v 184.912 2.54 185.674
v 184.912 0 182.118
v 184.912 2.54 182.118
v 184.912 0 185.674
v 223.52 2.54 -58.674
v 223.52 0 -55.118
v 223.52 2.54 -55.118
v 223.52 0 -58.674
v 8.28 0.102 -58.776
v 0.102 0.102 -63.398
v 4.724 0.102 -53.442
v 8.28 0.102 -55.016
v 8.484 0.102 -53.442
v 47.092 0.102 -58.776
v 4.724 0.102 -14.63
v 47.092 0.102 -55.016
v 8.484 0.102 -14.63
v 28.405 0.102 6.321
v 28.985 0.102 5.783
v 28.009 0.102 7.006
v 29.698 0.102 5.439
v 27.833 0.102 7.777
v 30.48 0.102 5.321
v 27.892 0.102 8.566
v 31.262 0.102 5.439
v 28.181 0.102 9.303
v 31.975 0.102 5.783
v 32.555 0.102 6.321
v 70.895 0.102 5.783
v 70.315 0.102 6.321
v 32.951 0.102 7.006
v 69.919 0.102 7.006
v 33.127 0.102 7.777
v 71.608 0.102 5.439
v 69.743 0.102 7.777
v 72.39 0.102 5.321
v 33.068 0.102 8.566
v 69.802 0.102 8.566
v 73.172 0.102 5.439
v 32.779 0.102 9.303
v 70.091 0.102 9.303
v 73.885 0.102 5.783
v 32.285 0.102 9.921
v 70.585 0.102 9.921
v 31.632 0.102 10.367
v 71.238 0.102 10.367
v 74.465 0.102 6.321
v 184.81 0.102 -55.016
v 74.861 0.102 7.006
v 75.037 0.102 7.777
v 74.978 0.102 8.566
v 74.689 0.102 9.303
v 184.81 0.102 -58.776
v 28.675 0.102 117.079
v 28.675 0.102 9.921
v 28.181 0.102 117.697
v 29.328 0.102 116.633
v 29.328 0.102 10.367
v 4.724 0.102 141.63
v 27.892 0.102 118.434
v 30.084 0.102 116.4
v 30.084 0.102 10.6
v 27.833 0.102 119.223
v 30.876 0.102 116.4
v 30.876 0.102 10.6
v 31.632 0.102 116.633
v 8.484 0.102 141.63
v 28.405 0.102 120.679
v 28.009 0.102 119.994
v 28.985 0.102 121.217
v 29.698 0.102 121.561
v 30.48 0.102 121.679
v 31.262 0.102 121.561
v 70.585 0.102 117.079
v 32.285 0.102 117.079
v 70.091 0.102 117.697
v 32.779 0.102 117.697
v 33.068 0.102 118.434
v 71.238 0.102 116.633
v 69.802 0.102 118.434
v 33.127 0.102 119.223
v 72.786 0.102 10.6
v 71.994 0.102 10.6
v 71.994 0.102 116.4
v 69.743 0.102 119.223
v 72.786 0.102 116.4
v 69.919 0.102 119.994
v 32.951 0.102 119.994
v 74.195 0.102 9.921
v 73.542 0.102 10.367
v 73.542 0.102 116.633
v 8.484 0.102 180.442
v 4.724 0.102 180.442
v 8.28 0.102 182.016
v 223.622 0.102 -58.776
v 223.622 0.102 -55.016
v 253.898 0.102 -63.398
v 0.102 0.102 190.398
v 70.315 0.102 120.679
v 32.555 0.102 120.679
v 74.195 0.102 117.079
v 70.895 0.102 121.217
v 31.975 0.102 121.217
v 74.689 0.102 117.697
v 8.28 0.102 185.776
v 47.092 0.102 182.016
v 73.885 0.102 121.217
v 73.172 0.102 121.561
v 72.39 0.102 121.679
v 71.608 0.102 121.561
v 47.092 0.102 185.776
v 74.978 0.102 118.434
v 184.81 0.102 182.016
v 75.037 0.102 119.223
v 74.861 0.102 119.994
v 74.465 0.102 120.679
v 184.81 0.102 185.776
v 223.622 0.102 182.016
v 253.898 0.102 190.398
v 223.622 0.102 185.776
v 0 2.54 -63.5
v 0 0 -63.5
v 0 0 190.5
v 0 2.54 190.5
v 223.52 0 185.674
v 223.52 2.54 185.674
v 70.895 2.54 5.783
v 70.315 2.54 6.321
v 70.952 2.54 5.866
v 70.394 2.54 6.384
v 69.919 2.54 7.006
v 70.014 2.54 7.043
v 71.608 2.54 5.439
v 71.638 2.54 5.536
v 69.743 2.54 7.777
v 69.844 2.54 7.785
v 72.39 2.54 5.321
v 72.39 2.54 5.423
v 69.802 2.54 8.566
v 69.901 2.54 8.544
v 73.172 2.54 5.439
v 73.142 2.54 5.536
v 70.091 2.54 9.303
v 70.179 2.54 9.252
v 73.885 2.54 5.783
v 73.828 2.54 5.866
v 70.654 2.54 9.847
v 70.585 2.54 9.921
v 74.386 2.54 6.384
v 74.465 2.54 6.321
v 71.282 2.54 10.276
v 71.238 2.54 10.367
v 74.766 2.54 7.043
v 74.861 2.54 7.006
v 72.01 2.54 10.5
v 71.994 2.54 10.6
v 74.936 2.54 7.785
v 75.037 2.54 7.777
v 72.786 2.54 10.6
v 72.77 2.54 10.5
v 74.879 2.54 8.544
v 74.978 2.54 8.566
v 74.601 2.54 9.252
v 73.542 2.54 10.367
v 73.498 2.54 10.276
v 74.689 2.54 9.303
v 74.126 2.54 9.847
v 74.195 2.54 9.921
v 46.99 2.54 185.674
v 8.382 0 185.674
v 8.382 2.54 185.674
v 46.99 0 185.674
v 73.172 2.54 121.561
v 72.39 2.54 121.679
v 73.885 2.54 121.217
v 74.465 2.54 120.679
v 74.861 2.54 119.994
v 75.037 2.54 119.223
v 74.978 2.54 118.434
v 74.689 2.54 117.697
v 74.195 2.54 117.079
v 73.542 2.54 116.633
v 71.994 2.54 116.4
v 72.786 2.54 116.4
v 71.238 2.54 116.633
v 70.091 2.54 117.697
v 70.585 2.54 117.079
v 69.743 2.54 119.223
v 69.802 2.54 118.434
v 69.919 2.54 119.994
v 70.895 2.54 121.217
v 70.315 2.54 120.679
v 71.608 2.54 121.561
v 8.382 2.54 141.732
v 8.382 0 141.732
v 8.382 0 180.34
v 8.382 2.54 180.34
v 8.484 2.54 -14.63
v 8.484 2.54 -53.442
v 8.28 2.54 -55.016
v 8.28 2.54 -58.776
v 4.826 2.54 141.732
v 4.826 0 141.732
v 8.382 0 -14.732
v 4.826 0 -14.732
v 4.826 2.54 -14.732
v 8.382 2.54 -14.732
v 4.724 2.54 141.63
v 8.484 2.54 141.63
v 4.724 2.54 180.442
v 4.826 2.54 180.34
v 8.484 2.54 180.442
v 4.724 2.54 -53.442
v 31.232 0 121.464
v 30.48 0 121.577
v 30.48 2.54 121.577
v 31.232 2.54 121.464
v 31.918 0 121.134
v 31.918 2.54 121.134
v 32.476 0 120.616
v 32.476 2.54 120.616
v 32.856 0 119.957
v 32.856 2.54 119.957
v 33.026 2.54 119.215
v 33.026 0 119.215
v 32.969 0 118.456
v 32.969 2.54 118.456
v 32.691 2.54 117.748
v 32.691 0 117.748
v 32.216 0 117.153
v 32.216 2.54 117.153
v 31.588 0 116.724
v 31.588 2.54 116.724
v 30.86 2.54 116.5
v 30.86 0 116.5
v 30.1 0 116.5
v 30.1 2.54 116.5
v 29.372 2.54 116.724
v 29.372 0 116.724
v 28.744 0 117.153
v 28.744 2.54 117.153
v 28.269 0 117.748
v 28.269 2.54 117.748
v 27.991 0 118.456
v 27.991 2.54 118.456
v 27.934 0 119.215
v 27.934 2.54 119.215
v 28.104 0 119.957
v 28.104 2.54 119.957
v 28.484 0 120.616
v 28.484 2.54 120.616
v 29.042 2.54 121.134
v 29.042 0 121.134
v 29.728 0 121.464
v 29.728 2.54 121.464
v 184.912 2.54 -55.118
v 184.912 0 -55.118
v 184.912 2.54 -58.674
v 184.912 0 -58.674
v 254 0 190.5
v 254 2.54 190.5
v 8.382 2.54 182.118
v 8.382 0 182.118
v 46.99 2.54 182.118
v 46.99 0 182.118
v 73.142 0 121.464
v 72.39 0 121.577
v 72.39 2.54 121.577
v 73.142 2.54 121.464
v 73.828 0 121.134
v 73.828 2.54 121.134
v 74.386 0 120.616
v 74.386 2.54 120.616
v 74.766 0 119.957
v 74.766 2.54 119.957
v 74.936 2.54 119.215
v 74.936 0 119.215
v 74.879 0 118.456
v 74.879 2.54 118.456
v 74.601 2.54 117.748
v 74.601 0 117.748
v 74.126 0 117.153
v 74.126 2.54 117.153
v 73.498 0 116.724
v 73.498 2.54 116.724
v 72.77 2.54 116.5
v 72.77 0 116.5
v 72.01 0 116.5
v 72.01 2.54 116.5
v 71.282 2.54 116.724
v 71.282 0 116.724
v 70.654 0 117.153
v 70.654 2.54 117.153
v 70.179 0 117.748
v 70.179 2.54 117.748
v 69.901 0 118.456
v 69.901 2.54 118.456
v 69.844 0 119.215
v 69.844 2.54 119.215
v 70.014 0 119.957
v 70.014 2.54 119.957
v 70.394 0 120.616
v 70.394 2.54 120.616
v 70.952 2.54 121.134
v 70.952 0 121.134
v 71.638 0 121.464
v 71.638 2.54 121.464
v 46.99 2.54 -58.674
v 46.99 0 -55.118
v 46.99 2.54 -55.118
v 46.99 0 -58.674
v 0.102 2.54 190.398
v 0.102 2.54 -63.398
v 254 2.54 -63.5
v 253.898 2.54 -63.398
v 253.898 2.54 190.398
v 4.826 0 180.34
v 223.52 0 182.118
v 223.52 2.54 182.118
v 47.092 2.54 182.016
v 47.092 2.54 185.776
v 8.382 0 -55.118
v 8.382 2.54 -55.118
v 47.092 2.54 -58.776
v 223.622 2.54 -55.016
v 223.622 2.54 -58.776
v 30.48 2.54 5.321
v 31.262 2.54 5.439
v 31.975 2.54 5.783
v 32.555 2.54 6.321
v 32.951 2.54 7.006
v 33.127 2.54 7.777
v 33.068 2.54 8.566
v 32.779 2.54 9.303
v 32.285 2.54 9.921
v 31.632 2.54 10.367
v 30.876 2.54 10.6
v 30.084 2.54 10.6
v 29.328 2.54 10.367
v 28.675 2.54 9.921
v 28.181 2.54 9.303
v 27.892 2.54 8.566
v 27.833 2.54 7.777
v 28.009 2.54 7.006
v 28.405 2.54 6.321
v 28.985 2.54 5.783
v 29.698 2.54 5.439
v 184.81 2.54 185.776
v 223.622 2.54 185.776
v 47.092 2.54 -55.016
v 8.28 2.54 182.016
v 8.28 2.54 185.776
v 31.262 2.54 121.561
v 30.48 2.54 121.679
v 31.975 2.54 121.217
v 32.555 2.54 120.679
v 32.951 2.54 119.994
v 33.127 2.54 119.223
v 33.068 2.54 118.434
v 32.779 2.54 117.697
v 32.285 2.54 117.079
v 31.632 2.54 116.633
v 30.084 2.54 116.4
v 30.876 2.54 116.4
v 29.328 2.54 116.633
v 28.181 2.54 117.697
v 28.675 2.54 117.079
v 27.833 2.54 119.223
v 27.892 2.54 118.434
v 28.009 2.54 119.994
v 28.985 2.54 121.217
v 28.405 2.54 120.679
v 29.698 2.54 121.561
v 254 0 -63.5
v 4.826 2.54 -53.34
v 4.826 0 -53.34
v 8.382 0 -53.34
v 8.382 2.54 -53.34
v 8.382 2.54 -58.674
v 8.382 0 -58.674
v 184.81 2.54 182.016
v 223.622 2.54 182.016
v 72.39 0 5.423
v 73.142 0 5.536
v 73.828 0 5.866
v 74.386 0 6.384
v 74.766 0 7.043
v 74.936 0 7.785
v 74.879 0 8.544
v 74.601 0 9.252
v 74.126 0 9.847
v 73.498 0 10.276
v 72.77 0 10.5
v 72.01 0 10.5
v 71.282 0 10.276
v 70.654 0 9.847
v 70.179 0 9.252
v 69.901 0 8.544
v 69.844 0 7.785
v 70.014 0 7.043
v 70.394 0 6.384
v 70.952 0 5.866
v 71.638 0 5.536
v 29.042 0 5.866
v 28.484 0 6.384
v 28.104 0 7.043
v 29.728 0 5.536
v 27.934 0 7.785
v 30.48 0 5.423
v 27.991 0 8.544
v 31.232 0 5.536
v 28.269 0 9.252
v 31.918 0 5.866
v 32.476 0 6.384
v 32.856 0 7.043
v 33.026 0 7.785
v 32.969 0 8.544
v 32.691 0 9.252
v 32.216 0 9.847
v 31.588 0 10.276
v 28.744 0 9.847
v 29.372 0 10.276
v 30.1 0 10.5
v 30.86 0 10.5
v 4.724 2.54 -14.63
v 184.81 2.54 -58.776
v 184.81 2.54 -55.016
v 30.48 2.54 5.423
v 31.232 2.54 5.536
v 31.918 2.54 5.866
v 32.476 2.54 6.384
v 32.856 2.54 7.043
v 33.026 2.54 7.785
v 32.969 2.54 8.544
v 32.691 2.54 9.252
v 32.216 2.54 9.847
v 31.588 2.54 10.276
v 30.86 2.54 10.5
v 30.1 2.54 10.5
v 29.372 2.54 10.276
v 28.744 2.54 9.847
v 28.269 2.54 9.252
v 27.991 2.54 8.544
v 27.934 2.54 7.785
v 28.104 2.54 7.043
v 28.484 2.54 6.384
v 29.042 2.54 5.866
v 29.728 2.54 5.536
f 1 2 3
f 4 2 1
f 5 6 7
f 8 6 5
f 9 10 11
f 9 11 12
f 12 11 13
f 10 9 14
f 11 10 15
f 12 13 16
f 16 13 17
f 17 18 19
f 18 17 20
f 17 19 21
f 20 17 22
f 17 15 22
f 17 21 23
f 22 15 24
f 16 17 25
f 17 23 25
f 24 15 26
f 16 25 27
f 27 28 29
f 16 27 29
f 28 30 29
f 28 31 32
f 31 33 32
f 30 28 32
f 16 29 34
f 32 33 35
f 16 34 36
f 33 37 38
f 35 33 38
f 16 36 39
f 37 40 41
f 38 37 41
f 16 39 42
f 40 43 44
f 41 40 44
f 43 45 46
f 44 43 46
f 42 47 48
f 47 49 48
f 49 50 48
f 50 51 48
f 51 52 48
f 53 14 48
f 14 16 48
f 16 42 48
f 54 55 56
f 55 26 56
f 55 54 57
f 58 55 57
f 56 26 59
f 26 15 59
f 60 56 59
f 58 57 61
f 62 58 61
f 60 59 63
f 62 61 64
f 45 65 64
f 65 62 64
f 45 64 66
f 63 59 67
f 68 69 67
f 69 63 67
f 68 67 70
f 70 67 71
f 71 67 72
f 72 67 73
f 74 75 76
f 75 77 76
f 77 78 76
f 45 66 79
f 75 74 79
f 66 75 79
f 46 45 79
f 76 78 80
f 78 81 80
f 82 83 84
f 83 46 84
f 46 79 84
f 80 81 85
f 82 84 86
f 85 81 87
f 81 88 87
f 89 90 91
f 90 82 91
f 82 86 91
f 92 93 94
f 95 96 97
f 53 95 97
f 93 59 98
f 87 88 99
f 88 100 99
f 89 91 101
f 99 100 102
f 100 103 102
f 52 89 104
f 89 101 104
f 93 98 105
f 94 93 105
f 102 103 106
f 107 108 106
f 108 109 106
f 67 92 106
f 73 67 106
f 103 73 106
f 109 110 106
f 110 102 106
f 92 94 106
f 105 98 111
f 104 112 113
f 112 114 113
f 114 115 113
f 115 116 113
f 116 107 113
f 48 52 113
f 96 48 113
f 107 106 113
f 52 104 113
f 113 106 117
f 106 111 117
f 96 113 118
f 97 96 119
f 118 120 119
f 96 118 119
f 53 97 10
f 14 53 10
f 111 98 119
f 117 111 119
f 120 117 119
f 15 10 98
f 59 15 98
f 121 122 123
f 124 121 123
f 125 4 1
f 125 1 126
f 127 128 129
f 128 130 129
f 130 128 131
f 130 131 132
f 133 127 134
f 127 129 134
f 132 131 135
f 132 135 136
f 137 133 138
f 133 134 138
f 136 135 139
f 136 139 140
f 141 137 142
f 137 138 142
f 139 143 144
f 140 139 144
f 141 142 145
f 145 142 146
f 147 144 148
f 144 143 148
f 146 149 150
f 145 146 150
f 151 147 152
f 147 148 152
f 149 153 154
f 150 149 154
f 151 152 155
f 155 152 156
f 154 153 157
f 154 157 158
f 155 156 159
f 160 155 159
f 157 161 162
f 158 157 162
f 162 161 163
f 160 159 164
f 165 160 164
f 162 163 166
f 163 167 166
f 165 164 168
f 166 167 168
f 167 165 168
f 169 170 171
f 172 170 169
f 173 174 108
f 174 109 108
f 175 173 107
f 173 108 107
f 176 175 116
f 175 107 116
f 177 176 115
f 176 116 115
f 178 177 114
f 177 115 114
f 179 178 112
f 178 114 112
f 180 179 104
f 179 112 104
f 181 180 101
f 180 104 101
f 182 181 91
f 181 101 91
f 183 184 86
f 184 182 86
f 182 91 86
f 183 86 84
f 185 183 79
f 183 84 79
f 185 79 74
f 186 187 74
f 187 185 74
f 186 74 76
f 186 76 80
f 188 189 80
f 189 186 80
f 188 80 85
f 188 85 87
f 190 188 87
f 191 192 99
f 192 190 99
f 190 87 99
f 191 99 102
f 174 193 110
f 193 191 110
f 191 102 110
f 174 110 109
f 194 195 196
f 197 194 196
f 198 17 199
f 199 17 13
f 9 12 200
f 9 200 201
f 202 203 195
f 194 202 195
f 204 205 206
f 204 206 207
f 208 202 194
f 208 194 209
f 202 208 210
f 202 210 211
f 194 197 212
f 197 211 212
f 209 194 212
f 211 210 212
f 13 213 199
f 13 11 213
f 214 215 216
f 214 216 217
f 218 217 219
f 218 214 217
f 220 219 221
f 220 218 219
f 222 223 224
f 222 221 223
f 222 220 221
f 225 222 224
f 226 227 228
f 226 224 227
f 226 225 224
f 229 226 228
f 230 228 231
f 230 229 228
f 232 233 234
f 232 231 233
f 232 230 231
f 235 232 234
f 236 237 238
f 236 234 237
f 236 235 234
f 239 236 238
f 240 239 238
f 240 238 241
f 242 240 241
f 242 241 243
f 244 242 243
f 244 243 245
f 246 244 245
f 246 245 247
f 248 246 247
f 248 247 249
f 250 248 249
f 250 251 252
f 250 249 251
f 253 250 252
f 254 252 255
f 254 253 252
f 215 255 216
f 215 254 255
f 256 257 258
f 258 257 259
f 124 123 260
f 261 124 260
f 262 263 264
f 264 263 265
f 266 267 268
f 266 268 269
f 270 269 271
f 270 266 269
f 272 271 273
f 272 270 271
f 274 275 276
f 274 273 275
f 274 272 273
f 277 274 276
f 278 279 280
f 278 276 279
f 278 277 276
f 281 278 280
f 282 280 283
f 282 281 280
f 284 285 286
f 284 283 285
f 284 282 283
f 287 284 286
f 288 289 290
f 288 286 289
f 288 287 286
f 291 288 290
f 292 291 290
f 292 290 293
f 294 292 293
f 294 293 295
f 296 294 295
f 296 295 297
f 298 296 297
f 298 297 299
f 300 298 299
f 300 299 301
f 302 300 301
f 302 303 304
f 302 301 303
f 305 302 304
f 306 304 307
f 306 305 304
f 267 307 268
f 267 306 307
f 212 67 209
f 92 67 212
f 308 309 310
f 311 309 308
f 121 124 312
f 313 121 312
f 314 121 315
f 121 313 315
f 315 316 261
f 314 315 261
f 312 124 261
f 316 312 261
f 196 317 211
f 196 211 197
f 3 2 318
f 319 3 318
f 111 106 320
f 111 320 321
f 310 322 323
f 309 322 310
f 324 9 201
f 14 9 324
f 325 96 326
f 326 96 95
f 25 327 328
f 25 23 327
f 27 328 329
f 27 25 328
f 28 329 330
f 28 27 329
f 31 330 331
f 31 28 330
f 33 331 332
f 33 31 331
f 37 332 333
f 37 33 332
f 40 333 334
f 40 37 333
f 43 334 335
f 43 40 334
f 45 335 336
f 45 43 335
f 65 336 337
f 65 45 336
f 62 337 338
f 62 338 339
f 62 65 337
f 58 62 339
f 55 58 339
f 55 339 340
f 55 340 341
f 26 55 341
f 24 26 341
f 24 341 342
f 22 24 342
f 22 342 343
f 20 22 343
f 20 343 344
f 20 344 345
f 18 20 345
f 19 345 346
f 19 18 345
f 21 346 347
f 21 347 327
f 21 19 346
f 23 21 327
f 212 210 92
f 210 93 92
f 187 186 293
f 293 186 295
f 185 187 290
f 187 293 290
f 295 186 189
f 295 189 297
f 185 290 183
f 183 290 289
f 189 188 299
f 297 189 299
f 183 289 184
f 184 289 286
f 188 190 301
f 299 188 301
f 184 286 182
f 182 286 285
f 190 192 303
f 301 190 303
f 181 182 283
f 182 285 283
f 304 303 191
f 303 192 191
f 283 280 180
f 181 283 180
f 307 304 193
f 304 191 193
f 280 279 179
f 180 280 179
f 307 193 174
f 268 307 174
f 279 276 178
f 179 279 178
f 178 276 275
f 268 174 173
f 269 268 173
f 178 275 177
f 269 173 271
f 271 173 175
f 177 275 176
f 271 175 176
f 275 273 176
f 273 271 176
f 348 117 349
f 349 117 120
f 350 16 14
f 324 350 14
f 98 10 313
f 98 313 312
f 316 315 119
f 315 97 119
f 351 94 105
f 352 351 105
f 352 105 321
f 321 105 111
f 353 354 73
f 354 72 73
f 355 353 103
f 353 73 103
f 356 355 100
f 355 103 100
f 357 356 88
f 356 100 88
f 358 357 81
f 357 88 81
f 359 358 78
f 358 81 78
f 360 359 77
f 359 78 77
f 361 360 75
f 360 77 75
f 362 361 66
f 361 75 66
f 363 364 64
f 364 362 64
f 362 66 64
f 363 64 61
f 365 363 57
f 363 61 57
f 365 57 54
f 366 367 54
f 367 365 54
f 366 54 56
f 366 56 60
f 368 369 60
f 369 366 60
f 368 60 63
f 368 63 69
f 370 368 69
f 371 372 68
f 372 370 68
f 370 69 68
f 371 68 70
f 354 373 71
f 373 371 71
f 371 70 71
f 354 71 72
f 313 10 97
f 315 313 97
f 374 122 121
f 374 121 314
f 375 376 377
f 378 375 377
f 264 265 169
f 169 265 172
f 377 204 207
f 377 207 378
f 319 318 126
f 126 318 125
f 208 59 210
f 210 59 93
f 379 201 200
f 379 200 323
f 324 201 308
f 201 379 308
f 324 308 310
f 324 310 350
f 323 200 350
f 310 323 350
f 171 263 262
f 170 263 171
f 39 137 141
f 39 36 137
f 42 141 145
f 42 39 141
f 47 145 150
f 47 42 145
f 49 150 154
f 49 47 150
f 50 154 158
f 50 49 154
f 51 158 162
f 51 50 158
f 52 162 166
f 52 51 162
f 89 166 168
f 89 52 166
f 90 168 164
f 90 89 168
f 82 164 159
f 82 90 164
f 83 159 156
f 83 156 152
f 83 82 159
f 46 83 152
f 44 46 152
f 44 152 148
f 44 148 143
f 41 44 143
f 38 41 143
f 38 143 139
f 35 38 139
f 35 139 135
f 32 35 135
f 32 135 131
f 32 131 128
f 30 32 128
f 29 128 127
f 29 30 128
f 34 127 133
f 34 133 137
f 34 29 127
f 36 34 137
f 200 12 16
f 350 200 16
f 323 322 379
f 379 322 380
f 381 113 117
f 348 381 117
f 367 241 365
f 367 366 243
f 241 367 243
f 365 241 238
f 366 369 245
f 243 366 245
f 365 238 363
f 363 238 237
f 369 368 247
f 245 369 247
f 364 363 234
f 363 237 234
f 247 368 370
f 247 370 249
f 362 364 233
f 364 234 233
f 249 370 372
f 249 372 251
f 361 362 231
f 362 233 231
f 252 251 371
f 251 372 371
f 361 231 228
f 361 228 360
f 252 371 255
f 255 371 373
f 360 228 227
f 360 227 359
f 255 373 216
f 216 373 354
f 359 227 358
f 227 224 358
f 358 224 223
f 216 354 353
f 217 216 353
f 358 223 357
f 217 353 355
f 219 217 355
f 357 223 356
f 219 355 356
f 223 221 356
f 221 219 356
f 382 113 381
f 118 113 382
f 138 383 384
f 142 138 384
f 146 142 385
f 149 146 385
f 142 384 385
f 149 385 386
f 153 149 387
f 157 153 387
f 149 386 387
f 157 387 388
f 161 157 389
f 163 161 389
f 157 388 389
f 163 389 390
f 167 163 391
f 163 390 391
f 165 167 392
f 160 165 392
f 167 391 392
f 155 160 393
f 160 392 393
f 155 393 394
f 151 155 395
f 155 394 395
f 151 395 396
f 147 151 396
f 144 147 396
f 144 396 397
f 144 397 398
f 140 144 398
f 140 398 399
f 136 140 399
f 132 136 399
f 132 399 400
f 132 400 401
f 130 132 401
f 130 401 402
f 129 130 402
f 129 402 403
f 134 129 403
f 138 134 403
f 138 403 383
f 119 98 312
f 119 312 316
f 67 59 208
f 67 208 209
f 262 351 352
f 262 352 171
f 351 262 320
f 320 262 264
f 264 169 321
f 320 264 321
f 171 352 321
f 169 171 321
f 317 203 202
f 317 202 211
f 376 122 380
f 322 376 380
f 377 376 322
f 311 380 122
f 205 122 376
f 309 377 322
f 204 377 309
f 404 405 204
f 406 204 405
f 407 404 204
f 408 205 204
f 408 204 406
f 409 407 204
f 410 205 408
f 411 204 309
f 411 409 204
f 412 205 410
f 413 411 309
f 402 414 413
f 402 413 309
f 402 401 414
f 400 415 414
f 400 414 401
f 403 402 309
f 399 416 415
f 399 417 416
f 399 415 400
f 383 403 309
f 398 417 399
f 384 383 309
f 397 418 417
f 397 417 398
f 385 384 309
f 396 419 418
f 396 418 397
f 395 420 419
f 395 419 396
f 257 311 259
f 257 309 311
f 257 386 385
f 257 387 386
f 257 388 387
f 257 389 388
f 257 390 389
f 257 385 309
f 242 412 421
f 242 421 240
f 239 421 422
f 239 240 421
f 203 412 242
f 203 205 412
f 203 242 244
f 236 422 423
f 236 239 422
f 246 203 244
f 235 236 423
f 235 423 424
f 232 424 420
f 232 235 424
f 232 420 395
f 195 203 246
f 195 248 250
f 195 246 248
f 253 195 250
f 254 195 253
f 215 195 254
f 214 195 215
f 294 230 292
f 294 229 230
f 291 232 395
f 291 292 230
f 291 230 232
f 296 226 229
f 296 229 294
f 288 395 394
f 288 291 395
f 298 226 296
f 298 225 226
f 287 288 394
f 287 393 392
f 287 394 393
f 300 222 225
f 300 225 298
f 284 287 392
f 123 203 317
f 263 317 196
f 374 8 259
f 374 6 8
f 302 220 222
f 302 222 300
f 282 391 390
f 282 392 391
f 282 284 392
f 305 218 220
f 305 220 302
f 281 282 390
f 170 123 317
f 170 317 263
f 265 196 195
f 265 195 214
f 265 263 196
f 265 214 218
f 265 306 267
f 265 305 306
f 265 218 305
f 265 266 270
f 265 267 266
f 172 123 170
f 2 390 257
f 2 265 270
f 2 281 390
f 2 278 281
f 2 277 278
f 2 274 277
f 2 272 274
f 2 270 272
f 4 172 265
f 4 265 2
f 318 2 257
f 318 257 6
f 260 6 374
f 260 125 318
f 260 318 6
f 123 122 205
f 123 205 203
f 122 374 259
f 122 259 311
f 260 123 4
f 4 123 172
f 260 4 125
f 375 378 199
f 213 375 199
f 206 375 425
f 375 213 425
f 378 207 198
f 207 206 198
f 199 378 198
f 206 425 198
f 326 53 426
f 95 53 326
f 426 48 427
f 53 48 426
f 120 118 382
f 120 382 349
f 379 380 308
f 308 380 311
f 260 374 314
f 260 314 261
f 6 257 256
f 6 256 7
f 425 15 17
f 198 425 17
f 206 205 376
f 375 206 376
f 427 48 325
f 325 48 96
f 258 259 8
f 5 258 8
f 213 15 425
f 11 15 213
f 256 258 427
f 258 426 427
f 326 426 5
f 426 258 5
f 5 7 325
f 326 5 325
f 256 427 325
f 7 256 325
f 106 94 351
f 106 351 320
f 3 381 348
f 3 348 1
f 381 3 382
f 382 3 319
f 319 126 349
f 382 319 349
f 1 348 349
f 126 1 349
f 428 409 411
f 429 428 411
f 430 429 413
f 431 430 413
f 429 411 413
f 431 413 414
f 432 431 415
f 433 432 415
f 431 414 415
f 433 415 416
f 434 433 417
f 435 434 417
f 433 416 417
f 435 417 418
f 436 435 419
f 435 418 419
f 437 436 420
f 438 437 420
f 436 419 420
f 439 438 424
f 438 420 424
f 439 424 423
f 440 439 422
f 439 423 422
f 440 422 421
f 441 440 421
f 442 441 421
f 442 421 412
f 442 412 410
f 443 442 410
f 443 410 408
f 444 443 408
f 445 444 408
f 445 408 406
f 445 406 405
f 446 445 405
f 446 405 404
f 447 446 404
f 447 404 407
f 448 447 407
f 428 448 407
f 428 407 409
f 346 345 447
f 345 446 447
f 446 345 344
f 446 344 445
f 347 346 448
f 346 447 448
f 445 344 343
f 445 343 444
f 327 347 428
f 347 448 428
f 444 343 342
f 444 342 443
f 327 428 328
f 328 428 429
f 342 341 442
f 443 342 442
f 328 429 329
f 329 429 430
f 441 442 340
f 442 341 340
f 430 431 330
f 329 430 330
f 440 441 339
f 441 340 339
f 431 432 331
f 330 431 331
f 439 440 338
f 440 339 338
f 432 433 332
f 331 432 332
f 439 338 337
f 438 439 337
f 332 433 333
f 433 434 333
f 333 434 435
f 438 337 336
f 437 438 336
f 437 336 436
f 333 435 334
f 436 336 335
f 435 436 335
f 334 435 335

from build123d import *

# Parameters (mm, degrees)
SKETCH1_W                  = 254
SKETCH1_H                  = 127
SKETCH1_W_2                = 38.608
SKETCH1_H_2                = 3.556
SKETCH1_W_3                = 3.556
SKETCH1_H_3                = 38.608
BOSS_EXTRUDE1_DEPTH        = 2.54
F_7_0_201_DIAMETER_HOLE1_D = 5.1054
SHELL1_T                   = -0.1016


with BuildPart() as part:
    # Sketch1 → Boss-Extrude1 (new body)
    with BuildSketch(Plane(origin=(0, 0, 0), x_dir=(1, 0, 0), z_dir=(0, 1, 0))):
        with Locations((127, 0)):
            Rectangle(SKETCH1_W, SKETCH1_H)
        with Locations((27.686, 56.896)):
            Rectangle(SKETCH1_W_2, SKETCH1_H_2, mode=Mode.SUBTRACT)
        with Locations((204.216, 56.896)):
            Rectangle(SKETCH1_W_2, SKETCH1_H_2, mode=Mode.SUBTRACT)
        with Locations((6.604, 34.036)):
            Rectangle(SKETCH1_W_3, SKETCH1_H_3, mode=Mode.SUBTRACT)
    boss_extrude1 = extrude(amount=BOSS_EXTRUDE1_DEPTH)

    # #7 (0.201) Diameter Hole1 (through all)
    with Locations(Plane(origin=(30.48, 2.54, 7.9756), x_dir=(0, 0, 1), z_dir=(0, 1, 0))):
        with Locations((0, 0), (0, 41.91)):
            f_7_0_201_diameter_hole1 = Hole(F_7_0_201_DIAMETER_HOLE1_D / 2)

    # Mirror1: Boss-Extrude1, #7 (0.201) Diameter Hole1 across plane
    add(boss_extrude1.mirror(Plane(origin=(0, 2.54, 63.5), x_dir=(1, 0, 0), z_dir=(0, 0, -1))))
    add(f_7_0_201_diameter_hole1.mirror(Plane(origin=(0, 2.54, 63.5), x_dir=(1, 0, 0), z_dir=(0, 0, -1))), mode=Mode.SUBTRACT)

    # Shell1
    shell1_openings = [part.faces().sort_by_distance(p)[0] for p in [
        (30.48, 2.54, 121.5771),
    ]]
    offset(amount=SHELL1_T, openings=shell1_openings, kind=Kind.INTERSECTION)


solid = part.part
